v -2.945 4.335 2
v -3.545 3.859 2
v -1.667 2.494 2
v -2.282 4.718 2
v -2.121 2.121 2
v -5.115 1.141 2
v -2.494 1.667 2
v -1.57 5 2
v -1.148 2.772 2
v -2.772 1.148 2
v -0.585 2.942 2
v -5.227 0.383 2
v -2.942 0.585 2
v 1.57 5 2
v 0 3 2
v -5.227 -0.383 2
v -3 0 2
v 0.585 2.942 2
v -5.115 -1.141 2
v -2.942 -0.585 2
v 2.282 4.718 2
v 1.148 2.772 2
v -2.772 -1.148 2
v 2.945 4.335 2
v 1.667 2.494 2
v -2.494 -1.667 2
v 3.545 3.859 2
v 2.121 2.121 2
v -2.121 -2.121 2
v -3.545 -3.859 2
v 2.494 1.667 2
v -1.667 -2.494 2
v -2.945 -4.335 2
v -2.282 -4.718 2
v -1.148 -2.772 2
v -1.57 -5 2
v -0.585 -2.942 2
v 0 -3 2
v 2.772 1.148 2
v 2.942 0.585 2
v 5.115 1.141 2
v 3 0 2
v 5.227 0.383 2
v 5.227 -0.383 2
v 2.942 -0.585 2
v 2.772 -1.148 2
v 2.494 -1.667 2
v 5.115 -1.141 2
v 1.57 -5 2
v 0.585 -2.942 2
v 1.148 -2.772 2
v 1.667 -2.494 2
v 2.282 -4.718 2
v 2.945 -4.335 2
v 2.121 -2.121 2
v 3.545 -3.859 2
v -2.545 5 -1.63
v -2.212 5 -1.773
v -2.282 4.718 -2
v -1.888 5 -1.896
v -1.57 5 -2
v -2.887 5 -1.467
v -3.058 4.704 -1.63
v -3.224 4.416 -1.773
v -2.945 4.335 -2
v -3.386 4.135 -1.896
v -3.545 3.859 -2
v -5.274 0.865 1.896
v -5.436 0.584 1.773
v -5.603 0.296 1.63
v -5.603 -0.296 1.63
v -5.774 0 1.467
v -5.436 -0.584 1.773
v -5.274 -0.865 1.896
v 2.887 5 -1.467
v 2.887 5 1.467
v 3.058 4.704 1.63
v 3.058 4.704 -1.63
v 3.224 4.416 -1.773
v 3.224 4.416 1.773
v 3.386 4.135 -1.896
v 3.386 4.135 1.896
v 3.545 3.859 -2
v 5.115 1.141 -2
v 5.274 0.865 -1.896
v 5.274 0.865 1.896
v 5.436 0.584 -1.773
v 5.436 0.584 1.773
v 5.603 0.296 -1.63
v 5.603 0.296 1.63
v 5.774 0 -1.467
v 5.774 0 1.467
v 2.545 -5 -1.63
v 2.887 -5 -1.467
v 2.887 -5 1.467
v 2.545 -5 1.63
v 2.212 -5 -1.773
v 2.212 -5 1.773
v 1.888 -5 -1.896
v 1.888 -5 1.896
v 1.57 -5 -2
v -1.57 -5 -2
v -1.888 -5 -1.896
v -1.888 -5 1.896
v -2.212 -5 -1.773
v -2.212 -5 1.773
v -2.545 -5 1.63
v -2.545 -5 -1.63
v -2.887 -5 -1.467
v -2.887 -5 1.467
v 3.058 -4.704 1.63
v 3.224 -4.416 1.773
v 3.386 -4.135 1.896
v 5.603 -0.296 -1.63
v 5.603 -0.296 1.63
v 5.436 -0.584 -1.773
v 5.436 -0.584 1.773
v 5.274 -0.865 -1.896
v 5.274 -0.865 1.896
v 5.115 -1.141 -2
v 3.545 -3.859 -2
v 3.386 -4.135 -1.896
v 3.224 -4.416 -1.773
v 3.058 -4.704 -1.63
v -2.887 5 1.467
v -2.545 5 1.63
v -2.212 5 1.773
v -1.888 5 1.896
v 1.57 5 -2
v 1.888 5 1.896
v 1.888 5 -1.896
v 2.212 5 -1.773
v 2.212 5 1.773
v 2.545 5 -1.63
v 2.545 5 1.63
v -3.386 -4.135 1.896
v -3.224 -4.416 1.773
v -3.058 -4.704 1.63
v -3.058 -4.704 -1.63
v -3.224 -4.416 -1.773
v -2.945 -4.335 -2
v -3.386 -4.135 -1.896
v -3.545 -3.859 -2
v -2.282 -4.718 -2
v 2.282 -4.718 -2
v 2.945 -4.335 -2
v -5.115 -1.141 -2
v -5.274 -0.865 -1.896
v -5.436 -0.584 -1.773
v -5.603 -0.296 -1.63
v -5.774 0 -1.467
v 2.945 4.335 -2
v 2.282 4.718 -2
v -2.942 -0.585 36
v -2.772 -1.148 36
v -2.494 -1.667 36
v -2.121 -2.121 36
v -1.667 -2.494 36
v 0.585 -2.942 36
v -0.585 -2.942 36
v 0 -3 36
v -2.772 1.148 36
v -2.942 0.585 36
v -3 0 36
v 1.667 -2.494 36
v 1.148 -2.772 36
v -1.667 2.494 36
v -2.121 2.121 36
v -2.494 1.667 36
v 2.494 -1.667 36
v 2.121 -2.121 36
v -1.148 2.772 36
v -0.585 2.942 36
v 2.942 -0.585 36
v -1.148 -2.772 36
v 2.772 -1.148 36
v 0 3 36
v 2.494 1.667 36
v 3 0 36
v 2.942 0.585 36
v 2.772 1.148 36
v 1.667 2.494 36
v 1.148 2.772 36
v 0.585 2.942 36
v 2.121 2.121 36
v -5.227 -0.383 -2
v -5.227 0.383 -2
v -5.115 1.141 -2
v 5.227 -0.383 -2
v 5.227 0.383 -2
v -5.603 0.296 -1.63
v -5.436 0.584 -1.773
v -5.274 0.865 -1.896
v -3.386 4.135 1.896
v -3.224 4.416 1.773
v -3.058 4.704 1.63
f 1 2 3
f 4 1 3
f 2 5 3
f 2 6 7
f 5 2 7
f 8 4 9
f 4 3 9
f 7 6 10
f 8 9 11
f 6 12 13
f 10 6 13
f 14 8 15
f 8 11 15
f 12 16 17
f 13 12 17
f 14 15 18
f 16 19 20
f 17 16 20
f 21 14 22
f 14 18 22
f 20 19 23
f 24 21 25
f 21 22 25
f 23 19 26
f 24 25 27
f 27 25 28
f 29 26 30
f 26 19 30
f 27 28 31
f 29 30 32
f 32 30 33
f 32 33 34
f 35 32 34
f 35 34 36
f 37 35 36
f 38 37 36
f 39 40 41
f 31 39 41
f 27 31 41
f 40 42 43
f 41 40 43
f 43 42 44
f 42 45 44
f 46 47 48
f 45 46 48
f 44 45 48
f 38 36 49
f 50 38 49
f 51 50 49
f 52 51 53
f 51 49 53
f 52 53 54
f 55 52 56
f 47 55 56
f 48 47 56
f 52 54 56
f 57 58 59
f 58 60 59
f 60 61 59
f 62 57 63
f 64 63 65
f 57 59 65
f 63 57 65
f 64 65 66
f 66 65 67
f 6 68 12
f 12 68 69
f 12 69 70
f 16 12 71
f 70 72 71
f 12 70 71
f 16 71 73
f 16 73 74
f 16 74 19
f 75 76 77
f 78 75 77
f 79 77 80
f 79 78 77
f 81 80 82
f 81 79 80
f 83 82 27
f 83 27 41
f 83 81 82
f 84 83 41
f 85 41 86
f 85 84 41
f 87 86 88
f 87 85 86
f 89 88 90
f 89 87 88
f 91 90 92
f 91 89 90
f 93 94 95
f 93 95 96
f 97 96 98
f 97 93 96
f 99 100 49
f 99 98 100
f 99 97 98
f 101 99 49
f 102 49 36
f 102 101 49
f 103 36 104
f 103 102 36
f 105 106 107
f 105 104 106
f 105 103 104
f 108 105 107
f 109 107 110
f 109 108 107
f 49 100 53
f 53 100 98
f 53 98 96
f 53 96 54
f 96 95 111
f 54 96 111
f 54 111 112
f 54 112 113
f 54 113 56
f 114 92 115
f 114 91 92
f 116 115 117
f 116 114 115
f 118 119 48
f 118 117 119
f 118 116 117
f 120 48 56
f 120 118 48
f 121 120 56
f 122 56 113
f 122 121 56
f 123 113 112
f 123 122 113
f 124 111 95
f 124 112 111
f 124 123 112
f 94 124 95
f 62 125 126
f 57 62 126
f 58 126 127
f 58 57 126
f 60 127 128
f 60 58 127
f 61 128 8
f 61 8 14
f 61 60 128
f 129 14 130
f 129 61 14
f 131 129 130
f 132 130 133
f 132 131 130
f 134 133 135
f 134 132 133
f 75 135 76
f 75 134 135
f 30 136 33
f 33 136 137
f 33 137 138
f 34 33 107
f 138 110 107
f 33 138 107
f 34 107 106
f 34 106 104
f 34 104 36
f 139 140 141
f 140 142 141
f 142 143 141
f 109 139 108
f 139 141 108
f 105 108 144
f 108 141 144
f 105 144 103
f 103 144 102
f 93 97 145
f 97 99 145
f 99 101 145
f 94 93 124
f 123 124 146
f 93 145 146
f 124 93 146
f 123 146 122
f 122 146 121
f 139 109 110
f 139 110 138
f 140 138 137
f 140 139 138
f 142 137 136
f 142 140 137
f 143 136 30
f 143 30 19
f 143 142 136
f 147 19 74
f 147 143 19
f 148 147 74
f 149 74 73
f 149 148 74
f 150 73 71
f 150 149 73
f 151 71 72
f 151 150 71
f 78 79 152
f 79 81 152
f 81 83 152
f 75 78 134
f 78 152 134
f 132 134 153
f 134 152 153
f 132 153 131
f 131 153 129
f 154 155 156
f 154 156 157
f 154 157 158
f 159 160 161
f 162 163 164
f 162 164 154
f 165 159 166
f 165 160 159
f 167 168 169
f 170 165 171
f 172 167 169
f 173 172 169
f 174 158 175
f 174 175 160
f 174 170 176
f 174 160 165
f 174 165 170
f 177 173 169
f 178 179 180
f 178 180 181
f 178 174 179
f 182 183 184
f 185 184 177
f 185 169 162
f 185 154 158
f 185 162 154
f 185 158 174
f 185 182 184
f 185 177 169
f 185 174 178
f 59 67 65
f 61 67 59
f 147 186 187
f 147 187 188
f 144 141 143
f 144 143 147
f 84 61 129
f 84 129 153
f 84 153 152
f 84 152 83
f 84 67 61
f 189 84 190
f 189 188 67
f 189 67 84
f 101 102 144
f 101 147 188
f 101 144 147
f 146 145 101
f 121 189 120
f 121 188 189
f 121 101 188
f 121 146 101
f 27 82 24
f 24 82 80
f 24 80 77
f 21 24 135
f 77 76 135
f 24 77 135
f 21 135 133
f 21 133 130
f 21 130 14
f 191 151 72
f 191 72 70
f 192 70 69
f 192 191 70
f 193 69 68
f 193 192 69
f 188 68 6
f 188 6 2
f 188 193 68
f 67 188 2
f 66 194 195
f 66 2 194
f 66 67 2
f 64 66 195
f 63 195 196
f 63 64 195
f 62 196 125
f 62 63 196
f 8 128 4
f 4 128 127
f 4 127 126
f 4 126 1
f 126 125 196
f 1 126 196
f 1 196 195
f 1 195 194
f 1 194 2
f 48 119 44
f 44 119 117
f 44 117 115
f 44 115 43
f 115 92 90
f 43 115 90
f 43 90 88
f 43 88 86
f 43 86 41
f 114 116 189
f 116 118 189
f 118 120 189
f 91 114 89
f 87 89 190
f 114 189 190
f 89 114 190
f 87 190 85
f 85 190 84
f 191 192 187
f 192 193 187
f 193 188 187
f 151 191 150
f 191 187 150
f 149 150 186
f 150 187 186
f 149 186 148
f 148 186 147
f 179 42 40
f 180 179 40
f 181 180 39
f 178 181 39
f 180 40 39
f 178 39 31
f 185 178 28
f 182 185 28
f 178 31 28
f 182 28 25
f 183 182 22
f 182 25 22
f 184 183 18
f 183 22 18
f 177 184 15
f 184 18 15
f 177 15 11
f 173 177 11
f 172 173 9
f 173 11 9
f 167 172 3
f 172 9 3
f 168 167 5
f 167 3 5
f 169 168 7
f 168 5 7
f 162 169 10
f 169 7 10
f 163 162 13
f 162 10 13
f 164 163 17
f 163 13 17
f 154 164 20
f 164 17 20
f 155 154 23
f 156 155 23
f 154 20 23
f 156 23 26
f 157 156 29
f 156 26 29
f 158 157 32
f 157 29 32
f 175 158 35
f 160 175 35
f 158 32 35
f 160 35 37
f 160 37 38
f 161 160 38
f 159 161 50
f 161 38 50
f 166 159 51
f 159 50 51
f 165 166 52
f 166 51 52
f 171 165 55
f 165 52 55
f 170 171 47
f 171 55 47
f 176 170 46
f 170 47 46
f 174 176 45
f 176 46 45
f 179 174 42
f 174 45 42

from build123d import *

# Parameters (mm, degrees)
PAD_DEPTH    = 2
SKETCH_R     = 3
PAD001_DEPTH = 34


with BuildPart() as part:
    # Sketch001 → Pad (new body, symmetric)
    with BuildSketch(Plane(origin=(0, 0, 0), x_dir=(1, 0, 0), z_dir=(0, 0, -1))):
        Polygon((5.773503, 0), (2.886751, 5), (-2.886751, 5), (-5.773503, 0), (-2.886751, -5), (2.886751, -5), align=None)
    extrude(amount=PAD_DEPTH, both=True)

    # Sketch (on Face7 of Pad) → Pad001 (join)
    with BuildSketch(Plane.XY.offset(2)):
        Circle(SKETCH_R)
    extrude(amount=PAD001_DEPTH)

    # Sketch002 → Groove (revolve, cut)
    with BuildSketch(Plane.XZ):
        Polygon((5.085171, 2.155414), (6.147601, 1.092984), (6.147601, -1.092984), (5.085171, -2.155414), (6.90312, -2.155414), (6.90312, 2.155414), align=None)
    revolve(axis=Axis((0, 0, 0), (0, 0, 1)), mode=Mode.SUBTRACT)


solid = part.part
